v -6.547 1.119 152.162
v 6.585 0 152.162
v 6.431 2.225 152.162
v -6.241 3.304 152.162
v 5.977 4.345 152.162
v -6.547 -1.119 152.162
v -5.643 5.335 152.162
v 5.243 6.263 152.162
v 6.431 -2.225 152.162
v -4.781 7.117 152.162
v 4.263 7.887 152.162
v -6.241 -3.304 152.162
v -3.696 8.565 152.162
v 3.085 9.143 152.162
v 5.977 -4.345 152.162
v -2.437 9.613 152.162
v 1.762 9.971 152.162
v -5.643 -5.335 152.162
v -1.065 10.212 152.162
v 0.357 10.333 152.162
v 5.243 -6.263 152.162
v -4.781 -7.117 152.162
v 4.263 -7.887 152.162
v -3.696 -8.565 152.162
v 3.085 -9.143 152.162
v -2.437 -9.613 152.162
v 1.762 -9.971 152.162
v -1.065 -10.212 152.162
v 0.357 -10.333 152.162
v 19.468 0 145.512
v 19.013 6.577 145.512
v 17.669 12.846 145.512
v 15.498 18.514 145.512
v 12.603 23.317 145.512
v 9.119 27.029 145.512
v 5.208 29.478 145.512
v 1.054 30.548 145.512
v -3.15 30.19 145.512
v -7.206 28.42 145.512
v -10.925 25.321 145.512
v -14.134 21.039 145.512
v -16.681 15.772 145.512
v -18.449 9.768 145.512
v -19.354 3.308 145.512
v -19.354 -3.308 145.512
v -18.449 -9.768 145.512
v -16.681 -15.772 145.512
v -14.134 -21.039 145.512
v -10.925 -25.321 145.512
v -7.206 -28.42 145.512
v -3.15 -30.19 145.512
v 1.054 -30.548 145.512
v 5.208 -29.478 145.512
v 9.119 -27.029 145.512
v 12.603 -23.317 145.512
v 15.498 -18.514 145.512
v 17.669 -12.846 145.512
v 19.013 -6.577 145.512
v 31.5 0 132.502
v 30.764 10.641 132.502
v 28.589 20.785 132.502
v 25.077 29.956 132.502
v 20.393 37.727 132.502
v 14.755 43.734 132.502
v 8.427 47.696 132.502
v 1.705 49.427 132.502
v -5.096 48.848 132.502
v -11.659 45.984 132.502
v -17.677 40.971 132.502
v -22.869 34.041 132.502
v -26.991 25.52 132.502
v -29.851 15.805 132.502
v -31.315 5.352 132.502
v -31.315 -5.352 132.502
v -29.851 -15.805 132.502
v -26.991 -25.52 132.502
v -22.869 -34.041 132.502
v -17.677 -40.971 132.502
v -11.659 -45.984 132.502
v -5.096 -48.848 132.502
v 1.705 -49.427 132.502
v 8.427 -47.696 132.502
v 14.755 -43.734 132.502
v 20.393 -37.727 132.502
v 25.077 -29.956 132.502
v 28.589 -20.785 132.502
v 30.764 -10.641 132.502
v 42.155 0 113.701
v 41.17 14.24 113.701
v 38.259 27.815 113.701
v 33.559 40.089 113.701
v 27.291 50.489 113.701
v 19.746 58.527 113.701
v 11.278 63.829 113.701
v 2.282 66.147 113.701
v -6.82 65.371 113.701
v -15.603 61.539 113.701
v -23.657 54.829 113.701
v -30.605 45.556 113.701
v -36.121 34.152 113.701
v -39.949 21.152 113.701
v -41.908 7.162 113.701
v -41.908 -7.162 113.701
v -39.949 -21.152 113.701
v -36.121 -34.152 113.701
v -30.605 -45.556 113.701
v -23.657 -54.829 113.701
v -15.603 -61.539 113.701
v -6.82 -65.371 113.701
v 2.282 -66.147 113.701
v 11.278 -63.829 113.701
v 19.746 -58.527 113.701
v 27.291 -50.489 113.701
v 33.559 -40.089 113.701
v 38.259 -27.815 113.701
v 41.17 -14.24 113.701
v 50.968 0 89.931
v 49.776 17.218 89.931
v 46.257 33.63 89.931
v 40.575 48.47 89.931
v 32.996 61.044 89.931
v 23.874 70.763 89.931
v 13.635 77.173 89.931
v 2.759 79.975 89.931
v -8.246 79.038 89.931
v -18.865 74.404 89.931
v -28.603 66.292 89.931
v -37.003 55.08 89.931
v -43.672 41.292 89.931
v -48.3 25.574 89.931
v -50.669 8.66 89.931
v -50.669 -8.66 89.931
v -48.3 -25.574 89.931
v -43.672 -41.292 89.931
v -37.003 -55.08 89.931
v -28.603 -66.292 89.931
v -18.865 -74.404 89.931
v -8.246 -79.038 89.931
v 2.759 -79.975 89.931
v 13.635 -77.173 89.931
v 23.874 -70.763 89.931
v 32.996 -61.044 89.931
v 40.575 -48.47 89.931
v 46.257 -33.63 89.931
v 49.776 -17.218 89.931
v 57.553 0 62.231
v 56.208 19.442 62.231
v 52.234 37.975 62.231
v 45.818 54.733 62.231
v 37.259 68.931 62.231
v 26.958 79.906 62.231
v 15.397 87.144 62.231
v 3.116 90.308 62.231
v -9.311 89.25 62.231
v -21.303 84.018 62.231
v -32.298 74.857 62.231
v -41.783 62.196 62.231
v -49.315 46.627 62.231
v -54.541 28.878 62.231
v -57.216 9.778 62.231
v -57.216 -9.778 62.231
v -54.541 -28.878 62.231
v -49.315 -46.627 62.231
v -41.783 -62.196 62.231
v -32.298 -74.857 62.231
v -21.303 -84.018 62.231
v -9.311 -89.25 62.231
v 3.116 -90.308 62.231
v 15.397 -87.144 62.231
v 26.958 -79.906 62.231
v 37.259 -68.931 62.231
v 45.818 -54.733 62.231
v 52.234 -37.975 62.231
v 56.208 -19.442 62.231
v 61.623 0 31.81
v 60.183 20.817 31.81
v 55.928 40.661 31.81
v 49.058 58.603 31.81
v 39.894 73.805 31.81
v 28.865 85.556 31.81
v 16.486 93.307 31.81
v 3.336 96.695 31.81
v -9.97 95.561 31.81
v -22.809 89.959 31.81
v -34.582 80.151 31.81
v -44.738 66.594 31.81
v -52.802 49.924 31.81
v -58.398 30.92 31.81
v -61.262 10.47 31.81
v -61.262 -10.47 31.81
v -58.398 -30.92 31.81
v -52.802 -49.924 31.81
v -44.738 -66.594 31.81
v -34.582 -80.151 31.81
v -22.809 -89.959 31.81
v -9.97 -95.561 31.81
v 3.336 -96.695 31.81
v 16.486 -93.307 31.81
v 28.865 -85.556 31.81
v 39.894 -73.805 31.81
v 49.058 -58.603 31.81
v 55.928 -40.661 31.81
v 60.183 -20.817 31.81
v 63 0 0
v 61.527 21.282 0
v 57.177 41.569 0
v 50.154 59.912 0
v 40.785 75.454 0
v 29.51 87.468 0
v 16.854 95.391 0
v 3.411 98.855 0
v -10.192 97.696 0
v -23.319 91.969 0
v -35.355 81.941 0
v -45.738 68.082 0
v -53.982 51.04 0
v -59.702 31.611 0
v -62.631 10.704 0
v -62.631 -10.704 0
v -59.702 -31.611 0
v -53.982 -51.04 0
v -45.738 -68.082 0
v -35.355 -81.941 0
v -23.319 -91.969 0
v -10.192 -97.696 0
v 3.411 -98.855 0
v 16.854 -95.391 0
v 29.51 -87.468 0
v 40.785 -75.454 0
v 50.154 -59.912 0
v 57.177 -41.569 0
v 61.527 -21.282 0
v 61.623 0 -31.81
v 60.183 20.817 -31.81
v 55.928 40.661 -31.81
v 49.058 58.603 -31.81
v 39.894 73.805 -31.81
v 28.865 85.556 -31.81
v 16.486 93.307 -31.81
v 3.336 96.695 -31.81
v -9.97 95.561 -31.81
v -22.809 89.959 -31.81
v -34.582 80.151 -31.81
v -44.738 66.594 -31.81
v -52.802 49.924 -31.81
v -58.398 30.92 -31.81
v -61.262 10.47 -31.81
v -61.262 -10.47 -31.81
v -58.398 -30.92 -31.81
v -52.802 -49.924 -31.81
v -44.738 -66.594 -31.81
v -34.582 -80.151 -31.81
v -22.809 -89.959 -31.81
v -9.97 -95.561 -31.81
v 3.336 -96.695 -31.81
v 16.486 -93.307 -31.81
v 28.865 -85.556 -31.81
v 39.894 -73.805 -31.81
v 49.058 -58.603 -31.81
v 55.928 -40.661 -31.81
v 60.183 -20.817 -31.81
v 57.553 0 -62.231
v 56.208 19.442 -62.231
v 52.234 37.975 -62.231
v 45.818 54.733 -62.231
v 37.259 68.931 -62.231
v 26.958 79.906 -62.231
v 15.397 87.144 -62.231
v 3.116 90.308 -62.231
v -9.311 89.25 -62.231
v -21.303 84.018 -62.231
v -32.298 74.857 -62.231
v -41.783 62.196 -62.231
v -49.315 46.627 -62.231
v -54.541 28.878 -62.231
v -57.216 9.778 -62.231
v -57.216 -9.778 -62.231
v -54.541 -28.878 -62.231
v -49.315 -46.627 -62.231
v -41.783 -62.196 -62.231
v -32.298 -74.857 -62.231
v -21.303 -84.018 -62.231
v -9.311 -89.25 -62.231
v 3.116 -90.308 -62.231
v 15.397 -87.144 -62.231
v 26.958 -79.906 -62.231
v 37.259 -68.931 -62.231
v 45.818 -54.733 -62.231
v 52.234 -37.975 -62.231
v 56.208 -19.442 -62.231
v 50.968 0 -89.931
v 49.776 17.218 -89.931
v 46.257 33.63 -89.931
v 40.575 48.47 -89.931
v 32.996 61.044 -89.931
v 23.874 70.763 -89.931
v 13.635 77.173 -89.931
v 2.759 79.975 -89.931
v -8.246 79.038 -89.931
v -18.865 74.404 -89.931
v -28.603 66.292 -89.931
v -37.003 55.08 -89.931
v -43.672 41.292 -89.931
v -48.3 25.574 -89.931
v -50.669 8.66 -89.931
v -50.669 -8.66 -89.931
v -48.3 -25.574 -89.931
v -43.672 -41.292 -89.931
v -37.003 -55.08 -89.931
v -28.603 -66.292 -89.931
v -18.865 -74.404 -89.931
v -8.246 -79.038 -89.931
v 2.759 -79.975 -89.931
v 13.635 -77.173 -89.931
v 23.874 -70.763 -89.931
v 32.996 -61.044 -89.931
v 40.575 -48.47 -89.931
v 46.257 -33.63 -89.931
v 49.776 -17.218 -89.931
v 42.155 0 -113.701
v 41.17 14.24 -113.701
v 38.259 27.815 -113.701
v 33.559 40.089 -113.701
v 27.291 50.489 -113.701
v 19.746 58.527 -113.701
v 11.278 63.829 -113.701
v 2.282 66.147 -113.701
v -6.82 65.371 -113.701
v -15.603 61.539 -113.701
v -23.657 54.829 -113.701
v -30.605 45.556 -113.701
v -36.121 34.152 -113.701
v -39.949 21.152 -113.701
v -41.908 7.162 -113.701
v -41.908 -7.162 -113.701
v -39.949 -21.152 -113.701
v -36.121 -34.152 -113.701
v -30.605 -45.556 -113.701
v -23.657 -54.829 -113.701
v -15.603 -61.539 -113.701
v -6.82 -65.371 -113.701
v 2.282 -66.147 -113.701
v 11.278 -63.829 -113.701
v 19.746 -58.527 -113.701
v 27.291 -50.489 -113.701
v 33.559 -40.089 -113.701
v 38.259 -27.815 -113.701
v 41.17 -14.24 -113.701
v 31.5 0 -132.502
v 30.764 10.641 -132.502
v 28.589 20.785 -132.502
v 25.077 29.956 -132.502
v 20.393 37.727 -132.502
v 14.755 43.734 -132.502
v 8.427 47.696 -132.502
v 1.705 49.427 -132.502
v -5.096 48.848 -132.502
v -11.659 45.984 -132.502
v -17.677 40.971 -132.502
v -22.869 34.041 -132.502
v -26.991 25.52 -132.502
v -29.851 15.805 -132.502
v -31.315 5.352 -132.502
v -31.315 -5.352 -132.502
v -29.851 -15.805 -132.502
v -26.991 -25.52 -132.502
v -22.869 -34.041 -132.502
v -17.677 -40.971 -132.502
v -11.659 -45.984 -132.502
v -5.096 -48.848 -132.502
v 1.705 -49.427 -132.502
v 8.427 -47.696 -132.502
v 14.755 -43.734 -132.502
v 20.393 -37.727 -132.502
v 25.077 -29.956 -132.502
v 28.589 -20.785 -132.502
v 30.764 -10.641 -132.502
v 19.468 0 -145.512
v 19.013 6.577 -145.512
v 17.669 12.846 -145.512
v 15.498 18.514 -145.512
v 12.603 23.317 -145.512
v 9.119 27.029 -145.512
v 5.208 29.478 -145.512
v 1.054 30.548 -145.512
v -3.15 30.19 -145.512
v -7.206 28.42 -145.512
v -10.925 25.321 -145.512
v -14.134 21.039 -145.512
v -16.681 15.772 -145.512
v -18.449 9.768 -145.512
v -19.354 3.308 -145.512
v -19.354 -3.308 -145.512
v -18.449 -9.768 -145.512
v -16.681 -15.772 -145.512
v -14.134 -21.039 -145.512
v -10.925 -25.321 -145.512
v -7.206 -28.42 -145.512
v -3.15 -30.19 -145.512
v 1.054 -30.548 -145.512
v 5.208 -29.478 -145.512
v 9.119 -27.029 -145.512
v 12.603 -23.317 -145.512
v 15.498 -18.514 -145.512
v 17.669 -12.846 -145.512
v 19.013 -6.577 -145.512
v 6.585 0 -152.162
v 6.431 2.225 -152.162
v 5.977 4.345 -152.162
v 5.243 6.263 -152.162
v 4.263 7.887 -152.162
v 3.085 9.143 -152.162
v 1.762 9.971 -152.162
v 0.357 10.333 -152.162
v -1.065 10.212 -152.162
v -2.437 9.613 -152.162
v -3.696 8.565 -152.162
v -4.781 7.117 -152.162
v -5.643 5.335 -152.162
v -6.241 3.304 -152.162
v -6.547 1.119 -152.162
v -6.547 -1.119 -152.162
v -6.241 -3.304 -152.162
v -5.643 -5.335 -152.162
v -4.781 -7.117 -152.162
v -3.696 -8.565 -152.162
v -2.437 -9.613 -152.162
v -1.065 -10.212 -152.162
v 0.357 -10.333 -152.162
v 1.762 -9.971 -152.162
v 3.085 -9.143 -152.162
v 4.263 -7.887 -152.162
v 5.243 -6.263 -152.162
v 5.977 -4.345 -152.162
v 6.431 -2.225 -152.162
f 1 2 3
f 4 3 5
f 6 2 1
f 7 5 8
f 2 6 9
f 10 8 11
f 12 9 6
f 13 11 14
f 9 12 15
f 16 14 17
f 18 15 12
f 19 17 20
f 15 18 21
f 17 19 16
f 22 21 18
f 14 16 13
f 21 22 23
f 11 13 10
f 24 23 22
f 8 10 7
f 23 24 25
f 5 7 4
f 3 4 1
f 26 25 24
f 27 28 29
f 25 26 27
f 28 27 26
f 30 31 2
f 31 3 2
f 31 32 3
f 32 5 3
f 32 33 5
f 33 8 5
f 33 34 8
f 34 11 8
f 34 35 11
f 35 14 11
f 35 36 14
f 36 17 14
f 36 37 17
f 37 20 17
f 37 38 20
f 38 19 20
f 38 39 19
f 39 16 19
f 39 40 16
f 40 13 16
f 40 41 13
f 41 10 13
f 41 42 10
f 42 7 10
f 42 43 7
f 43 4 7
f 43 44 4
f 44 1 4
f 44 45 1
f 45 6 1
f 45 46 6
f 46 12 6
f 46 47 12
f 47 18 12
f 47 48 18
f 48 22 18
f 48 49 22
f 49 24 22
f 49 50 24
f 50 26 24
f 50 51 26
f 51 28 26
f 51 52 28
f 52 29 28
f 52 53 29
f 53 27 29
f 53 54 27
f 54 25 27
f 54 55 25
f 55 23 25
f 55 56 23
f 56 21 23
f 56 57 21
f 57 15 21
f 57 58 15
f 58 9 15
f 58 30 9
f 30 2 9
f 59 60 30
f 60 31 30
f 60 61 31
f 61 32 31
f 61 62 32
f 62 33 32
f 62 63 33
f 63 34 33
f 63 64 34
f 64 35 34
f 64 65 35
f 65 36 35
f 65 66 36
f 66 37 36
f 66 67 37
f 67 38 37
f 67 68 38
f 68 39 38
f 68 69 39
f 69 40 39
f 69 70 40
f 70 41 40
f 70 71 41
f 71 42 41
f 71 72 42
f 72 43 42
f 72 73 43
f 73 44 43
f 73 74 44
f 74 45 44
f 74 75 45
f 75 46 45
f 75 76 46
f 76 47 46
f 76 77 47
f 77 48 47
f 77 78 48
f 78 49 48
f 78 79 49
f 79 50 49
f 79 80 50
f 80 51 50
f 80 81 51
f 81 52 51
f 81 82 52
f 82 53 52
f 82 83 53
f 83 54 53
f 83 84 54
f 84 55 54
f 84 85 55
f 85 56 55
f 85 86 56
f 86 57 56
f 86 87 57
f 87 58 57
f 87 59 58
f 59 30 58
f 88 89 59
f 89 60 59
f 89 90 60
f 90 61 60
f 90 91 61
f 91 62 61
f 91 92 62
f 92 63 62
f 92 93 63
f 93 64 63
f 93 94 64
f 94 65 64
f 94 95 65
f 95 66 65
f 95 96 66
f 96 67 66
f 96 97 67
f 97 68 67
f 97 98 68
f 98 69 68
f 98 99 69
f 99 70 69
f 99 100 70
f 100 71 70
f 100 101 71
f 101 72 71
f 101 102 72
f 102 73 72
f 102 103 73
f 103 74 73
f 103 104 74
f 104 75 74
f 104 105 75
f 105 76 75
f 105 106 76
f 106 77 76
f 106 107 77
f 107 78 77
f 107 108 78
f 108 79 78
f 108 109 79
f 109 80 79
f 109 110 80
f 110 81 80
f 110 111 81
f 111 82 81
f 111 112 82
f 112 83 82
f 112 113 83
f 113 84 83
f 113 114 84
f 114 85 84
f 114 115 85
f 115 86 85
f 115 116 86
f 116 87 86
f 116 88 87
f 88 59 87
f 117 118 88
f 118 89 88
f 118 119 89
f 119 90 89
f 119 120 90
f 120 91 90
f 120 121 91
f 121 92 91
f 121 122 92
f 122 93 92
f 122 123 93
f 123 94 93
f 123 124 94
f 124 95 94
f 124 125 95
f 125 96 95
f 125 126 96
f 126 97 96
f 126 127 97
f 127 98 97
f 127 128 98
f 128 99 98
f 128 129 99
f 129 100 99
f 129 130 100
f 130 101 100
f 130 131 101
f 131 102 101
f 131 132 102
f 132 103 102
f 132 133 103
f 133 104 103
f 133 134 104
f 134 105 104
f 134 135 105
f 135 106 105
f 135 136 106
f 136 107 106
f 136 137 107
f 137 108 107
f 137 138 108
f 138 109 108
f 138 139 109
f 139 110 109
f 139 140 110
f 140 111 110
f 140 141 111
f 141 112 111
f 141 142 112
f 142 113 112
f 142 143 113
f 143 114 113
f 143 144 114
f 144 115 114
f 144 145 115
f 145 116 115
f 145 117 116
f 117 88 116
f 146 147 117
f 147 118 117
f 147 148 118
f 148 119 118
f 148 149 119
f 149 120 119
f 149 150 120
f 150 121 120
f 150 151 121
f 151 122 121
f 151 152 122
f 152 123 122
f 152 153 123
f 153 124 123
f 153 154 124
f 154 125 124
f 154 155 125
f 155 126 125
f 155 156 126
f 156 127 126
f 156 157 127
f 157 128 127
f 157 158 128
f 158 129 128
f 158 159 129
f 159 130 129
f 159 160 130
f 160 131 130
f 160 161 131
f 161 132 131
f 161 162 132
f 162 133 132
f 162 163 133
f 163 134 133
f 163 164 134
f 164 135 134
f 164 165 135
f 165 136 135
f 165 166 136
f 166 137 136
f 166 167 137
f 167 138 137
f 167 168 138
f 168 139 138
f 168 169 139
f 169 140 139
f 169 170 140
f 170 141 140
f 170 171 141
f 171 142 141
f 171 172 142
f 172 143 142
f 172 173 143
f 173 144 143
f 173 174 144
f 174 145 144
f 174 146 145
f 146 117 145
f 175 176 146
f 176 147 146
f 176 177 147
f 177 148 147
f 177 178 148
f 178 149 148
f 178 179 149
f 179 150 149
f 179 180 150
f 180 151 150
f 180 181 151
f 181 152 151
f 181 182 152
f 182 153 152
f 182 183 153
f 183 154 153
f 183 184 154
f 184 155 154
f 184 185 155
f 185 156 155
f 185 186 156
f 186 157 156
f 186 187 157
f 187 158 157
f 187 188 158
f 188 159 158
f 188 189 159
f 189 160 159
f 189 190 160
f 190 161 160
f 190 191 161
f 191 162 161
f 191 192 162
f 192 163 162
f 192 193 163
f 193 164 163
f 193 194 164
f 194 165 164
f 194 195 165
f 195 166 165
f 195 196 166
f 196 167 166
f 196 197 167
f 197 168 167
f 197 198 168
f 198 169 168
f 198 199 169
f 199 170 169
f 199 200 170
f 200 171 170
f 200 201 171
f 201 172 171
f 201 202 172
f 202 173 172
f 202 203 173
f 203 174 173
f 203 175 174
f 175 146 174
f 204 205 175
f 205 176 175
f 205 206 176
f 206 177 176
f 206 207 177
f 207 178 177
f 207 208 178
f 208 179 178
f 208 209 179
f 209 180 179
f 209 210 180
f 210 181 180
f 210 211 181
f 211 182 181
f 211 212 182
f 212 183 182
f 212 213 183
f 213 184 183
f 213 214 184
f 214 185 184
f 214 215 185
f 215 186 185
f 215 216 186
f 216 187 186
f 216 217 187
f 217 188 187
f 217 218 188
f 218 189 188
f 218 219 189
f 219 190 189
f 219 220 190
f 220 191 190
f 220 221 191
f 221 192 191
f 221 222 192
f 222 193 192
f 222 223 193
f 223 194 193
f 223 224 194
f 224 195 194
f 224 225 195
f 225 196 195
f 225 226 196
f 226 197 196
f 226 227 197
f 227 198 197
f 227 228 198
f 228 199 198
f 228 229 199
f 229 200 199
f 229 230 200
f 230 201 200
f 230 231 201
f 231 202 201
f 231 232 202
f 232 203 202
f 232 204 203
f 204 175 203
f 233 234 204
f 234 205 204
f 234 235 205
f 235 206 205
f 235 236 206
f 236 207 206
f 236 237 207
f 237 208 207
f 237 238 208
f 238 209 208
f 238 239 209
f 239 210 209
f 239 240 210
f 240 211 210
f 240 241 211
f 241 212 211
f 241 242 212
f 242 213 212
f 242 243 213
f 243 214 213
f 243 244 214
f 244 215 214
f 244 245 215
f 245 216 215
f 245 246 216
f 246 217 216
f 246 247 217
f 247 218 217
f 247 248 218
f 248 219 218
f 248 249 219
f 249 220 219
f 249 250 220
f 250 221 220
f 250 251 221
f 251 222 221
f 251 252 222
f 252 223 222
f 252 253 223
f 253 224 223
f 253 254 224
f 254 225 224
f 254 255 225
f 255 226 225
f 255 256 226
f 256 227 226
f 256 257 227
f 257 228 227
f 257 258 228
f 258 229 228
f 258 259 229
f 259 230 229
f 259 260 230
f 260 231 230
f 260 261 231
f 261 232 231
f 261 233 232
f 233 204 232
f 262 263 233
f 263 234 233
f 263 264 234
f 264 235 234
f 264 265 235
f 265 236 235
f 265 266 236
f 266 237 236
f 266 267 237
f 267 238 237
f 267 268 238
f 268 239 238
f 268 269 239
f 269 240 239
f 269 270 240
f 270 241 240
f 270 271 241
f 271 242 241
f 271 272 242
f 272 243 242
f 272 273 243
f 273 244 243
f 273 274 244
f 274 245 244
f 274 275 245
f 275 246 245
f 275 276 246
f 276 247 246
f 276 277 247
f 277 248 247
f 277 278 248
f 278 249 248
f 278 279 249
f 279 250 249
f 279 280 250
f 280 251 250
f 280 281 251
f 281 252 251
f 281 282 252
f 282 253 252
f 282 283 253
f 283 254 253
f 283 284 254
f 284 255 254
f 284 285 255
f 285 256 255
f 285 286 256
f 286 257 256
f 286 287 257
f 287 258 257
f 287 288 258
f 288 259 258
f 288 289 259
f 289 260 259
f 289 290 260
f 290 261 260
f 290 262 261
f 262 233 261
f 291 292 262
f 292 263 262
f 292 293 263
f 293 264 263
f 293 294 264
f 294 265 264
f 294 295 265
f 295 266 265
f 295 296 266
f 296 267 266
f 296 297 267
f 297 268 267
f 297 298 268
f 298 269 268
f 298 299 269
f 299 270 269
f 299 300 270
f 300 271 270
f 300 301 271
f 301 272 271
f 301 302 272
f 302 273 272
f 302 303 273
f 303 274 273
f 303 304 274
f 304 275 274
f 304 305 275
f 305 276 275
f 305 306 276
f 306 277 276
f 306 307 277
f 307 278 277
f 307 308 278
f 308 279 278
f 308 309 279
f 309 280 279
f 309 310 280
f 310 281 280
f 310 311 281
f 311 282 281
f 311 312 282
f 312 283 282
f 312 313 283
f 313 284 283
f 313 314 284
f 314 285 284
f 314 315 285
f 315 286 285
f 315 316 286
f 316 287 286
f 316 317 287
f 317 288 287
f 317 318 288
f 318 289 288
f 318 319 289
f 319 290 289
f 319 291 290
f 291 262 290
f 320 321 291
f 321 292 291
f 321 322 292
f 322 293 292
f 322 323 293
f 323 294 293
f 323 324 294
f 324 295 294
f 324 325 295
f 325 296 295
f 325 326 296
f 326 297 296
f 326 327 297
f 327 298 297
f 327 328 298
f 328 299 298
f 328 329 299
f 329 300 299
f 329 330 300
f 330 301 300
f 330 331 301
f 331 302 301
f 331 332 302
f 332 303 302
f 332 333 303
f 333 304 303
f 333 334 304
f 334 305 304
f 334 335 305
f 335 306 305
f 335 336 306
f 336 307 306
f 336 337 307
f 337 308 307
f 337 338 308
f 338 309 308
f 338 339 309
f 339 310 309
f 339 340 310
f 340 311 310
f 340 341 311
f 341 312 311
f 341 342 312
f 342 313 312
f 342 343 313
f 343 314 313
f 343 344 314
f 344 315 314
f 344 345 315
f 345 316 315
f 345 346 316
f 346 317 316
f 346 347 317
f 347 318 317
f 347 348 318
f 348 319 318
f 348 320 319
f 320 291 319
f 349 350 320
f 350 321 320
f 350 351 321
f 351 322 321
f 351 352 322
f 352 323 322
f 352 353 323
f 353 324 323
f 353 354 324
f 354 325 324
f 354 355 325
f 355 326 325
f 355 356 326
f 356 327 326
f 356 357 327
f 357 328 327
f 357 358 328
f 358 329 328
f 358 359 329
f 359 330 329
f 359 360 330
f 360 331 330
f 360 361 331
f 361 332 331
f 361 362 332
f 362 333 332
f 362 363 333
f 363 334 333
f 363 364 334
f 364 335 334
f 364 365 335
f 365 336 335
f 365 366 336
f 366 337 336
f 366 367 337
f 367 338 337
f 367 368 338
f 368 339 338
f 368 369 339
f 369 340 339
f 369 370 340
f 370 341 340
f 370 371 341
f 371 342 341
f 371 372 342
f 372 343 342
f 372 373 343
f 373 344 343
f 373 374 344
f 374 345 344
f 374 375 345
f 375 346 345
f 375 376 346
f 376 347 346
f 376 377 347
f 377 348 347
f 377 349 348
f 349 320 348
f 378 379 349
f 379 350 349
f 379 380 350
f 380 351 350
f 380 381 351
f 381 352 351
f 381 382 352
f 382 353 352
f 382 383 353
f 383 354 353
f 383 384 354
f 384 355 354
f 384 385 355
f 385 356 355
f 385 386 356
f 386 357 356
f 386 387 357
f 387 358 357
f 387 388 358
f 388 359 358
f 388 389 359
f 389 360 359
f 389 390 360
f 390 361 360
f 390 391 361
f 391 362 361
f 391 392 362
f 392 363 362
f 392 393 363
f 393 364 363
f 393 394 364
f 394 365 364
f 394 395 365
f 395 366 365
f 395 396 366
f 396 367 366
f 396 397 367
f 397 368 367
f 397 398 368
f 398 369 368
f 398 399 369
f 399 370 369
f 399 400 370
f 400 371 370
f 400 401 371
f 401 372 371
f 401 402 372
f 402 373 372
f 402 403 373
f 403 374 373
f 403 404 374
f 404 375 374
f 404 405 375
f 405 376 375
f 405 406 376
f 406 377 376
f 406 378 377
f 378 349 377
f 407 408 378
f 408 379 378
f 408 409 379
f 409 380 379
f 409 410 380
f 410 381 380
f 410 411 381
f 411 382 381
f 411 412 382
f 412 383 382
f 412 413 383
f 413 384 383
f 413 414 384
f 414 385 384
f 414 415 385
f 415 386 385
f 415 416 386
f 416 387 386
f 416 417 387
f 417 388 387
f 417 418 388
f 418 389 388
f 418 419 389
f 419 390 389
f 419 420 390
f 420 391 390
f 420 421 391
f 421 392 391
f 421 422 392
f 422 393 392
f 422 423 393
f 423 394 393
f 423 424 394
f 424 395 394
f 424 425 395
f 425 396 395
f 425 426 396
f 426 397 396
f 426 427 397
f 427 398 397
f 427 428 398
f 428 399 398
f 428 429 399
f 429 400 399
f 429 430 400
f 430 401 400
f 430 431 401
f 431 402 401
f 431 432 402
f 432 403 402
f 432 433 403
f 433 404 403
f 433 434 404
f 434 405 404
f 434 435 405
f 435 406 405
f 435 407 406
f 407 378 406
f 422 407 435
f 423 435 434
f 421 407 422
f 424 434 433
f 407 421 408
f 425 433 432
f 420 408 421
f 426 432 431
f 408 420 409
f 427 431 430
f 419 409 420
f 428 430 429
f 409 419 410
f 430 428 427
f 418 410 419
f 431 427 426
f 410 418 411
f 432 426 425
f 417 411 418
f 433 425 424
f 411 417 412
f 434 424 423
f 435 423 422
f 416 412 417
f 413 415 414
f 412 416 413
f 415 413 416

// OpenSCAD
// Generated by SolidPython 1.0.1 on 2020-07-29 00:46:47


scale(v = [7, 11, 17]) {
	sphere(r = 9);
}
/***********************************************
*********      SolidPython code:      **********
************************************************
 
# import packages: SolidPython
from solid import *
from solid.utils import *
from itertools import chain, combinations, permutations


class Resize:

    def __init__(self, scad_file):
        self.scad_file = scad_file
        #self.scad_file = import_scad(scad_file)
        # cone/cylinder param:
        self.r1 = 0
        self.r2 = 0
        self.h = 0
        # rectangular prism param:
        self.w = 0
        self.l = 0
        # ellipse param:
        self.r = 0

    # import OpenScad code (file name corresponds to shape)


    # classify shape + parameters
    def assign(self, param1, param2, param3):
        if self.scad_file == 'cone.scad':
            self.r1 = param1
            self.r2 = param2
            self.h = param3
        elif self.scad_file == 'cylinder.scad':
            self.r1 = param1
            self.r2 = param2
            self.h = param3
        elif self.scad_file == 'rectangularPrism.scad':
            self.h = param1
            self.l = param2
            self.w = param3
        else:
            self.r = param1
            self.h = param2

    # resize parameters
    def iterate(self):
        x = range(3, 20, 2)
        i = 1
        if self.scad_file == 'cone.scad':
            tempList = list(permutations(x, 2))
            for temp in tempList:
                param1 = temp[0]
                param2 = temp[1]
                filepath = 'produced_scad_files/' + 'cone' + str(param1) + '_' + str(param2) + '_' + '.scad'
                scad_render_to_file(cylinder(h=param1, r1=param2, r2=0), filepath)

        elif self.scad_file == 'cylinder.scad':
            tempList = list(permutations(x, 3))
            for temp in tempList:
                param1 = temp[0]
                param2 = temp[1]
                filepath = 'produced_scad_files/' + 'cylinder' + str(param1) + '_' + str(param2) + '_' + '.scad'
                scad_render_to_file(cylinder(h=param1, r1=param2, r2=param2), filepath)

        elif self.scad_file == 'rectangularPrism.scad':
            tempList = list(permutations(x, 3))
            for temp in tempList:
                param1 = temp[0]
                param2 = temp[1]
                param3 = temp[2]
                filepath = 'produced_scad_files/' + 'rectangularPrism' + str(param1) + '_' + str(param2) + '_' + str(
                    param3) + '.scad'
                scad_render_to_file(cube(size=(param1, param2, param3)), filepath)

        elif self.scad_file == 'ellipse.scad':
            tempList = list(permutations(x, 4))
            for temp in tempList:
                param1 = temp[0]
                param2 = temp[1]
                param3 = temp[2]
                param4 = temp[3]
                filepath = 'produced_scad_files/' + 'ellipse' + str(param1) + '_' + str(param2) + '_' + str(param3) + '_' + str(param4) + '.scad'
                scad_render_to_file(scale([param1, param2, param3])(sphere(r=param4)), filepath)

    def render_to_scadfile(self):
        scad_render_to_file(scad, 'example.scad') 
 
************************************************/
